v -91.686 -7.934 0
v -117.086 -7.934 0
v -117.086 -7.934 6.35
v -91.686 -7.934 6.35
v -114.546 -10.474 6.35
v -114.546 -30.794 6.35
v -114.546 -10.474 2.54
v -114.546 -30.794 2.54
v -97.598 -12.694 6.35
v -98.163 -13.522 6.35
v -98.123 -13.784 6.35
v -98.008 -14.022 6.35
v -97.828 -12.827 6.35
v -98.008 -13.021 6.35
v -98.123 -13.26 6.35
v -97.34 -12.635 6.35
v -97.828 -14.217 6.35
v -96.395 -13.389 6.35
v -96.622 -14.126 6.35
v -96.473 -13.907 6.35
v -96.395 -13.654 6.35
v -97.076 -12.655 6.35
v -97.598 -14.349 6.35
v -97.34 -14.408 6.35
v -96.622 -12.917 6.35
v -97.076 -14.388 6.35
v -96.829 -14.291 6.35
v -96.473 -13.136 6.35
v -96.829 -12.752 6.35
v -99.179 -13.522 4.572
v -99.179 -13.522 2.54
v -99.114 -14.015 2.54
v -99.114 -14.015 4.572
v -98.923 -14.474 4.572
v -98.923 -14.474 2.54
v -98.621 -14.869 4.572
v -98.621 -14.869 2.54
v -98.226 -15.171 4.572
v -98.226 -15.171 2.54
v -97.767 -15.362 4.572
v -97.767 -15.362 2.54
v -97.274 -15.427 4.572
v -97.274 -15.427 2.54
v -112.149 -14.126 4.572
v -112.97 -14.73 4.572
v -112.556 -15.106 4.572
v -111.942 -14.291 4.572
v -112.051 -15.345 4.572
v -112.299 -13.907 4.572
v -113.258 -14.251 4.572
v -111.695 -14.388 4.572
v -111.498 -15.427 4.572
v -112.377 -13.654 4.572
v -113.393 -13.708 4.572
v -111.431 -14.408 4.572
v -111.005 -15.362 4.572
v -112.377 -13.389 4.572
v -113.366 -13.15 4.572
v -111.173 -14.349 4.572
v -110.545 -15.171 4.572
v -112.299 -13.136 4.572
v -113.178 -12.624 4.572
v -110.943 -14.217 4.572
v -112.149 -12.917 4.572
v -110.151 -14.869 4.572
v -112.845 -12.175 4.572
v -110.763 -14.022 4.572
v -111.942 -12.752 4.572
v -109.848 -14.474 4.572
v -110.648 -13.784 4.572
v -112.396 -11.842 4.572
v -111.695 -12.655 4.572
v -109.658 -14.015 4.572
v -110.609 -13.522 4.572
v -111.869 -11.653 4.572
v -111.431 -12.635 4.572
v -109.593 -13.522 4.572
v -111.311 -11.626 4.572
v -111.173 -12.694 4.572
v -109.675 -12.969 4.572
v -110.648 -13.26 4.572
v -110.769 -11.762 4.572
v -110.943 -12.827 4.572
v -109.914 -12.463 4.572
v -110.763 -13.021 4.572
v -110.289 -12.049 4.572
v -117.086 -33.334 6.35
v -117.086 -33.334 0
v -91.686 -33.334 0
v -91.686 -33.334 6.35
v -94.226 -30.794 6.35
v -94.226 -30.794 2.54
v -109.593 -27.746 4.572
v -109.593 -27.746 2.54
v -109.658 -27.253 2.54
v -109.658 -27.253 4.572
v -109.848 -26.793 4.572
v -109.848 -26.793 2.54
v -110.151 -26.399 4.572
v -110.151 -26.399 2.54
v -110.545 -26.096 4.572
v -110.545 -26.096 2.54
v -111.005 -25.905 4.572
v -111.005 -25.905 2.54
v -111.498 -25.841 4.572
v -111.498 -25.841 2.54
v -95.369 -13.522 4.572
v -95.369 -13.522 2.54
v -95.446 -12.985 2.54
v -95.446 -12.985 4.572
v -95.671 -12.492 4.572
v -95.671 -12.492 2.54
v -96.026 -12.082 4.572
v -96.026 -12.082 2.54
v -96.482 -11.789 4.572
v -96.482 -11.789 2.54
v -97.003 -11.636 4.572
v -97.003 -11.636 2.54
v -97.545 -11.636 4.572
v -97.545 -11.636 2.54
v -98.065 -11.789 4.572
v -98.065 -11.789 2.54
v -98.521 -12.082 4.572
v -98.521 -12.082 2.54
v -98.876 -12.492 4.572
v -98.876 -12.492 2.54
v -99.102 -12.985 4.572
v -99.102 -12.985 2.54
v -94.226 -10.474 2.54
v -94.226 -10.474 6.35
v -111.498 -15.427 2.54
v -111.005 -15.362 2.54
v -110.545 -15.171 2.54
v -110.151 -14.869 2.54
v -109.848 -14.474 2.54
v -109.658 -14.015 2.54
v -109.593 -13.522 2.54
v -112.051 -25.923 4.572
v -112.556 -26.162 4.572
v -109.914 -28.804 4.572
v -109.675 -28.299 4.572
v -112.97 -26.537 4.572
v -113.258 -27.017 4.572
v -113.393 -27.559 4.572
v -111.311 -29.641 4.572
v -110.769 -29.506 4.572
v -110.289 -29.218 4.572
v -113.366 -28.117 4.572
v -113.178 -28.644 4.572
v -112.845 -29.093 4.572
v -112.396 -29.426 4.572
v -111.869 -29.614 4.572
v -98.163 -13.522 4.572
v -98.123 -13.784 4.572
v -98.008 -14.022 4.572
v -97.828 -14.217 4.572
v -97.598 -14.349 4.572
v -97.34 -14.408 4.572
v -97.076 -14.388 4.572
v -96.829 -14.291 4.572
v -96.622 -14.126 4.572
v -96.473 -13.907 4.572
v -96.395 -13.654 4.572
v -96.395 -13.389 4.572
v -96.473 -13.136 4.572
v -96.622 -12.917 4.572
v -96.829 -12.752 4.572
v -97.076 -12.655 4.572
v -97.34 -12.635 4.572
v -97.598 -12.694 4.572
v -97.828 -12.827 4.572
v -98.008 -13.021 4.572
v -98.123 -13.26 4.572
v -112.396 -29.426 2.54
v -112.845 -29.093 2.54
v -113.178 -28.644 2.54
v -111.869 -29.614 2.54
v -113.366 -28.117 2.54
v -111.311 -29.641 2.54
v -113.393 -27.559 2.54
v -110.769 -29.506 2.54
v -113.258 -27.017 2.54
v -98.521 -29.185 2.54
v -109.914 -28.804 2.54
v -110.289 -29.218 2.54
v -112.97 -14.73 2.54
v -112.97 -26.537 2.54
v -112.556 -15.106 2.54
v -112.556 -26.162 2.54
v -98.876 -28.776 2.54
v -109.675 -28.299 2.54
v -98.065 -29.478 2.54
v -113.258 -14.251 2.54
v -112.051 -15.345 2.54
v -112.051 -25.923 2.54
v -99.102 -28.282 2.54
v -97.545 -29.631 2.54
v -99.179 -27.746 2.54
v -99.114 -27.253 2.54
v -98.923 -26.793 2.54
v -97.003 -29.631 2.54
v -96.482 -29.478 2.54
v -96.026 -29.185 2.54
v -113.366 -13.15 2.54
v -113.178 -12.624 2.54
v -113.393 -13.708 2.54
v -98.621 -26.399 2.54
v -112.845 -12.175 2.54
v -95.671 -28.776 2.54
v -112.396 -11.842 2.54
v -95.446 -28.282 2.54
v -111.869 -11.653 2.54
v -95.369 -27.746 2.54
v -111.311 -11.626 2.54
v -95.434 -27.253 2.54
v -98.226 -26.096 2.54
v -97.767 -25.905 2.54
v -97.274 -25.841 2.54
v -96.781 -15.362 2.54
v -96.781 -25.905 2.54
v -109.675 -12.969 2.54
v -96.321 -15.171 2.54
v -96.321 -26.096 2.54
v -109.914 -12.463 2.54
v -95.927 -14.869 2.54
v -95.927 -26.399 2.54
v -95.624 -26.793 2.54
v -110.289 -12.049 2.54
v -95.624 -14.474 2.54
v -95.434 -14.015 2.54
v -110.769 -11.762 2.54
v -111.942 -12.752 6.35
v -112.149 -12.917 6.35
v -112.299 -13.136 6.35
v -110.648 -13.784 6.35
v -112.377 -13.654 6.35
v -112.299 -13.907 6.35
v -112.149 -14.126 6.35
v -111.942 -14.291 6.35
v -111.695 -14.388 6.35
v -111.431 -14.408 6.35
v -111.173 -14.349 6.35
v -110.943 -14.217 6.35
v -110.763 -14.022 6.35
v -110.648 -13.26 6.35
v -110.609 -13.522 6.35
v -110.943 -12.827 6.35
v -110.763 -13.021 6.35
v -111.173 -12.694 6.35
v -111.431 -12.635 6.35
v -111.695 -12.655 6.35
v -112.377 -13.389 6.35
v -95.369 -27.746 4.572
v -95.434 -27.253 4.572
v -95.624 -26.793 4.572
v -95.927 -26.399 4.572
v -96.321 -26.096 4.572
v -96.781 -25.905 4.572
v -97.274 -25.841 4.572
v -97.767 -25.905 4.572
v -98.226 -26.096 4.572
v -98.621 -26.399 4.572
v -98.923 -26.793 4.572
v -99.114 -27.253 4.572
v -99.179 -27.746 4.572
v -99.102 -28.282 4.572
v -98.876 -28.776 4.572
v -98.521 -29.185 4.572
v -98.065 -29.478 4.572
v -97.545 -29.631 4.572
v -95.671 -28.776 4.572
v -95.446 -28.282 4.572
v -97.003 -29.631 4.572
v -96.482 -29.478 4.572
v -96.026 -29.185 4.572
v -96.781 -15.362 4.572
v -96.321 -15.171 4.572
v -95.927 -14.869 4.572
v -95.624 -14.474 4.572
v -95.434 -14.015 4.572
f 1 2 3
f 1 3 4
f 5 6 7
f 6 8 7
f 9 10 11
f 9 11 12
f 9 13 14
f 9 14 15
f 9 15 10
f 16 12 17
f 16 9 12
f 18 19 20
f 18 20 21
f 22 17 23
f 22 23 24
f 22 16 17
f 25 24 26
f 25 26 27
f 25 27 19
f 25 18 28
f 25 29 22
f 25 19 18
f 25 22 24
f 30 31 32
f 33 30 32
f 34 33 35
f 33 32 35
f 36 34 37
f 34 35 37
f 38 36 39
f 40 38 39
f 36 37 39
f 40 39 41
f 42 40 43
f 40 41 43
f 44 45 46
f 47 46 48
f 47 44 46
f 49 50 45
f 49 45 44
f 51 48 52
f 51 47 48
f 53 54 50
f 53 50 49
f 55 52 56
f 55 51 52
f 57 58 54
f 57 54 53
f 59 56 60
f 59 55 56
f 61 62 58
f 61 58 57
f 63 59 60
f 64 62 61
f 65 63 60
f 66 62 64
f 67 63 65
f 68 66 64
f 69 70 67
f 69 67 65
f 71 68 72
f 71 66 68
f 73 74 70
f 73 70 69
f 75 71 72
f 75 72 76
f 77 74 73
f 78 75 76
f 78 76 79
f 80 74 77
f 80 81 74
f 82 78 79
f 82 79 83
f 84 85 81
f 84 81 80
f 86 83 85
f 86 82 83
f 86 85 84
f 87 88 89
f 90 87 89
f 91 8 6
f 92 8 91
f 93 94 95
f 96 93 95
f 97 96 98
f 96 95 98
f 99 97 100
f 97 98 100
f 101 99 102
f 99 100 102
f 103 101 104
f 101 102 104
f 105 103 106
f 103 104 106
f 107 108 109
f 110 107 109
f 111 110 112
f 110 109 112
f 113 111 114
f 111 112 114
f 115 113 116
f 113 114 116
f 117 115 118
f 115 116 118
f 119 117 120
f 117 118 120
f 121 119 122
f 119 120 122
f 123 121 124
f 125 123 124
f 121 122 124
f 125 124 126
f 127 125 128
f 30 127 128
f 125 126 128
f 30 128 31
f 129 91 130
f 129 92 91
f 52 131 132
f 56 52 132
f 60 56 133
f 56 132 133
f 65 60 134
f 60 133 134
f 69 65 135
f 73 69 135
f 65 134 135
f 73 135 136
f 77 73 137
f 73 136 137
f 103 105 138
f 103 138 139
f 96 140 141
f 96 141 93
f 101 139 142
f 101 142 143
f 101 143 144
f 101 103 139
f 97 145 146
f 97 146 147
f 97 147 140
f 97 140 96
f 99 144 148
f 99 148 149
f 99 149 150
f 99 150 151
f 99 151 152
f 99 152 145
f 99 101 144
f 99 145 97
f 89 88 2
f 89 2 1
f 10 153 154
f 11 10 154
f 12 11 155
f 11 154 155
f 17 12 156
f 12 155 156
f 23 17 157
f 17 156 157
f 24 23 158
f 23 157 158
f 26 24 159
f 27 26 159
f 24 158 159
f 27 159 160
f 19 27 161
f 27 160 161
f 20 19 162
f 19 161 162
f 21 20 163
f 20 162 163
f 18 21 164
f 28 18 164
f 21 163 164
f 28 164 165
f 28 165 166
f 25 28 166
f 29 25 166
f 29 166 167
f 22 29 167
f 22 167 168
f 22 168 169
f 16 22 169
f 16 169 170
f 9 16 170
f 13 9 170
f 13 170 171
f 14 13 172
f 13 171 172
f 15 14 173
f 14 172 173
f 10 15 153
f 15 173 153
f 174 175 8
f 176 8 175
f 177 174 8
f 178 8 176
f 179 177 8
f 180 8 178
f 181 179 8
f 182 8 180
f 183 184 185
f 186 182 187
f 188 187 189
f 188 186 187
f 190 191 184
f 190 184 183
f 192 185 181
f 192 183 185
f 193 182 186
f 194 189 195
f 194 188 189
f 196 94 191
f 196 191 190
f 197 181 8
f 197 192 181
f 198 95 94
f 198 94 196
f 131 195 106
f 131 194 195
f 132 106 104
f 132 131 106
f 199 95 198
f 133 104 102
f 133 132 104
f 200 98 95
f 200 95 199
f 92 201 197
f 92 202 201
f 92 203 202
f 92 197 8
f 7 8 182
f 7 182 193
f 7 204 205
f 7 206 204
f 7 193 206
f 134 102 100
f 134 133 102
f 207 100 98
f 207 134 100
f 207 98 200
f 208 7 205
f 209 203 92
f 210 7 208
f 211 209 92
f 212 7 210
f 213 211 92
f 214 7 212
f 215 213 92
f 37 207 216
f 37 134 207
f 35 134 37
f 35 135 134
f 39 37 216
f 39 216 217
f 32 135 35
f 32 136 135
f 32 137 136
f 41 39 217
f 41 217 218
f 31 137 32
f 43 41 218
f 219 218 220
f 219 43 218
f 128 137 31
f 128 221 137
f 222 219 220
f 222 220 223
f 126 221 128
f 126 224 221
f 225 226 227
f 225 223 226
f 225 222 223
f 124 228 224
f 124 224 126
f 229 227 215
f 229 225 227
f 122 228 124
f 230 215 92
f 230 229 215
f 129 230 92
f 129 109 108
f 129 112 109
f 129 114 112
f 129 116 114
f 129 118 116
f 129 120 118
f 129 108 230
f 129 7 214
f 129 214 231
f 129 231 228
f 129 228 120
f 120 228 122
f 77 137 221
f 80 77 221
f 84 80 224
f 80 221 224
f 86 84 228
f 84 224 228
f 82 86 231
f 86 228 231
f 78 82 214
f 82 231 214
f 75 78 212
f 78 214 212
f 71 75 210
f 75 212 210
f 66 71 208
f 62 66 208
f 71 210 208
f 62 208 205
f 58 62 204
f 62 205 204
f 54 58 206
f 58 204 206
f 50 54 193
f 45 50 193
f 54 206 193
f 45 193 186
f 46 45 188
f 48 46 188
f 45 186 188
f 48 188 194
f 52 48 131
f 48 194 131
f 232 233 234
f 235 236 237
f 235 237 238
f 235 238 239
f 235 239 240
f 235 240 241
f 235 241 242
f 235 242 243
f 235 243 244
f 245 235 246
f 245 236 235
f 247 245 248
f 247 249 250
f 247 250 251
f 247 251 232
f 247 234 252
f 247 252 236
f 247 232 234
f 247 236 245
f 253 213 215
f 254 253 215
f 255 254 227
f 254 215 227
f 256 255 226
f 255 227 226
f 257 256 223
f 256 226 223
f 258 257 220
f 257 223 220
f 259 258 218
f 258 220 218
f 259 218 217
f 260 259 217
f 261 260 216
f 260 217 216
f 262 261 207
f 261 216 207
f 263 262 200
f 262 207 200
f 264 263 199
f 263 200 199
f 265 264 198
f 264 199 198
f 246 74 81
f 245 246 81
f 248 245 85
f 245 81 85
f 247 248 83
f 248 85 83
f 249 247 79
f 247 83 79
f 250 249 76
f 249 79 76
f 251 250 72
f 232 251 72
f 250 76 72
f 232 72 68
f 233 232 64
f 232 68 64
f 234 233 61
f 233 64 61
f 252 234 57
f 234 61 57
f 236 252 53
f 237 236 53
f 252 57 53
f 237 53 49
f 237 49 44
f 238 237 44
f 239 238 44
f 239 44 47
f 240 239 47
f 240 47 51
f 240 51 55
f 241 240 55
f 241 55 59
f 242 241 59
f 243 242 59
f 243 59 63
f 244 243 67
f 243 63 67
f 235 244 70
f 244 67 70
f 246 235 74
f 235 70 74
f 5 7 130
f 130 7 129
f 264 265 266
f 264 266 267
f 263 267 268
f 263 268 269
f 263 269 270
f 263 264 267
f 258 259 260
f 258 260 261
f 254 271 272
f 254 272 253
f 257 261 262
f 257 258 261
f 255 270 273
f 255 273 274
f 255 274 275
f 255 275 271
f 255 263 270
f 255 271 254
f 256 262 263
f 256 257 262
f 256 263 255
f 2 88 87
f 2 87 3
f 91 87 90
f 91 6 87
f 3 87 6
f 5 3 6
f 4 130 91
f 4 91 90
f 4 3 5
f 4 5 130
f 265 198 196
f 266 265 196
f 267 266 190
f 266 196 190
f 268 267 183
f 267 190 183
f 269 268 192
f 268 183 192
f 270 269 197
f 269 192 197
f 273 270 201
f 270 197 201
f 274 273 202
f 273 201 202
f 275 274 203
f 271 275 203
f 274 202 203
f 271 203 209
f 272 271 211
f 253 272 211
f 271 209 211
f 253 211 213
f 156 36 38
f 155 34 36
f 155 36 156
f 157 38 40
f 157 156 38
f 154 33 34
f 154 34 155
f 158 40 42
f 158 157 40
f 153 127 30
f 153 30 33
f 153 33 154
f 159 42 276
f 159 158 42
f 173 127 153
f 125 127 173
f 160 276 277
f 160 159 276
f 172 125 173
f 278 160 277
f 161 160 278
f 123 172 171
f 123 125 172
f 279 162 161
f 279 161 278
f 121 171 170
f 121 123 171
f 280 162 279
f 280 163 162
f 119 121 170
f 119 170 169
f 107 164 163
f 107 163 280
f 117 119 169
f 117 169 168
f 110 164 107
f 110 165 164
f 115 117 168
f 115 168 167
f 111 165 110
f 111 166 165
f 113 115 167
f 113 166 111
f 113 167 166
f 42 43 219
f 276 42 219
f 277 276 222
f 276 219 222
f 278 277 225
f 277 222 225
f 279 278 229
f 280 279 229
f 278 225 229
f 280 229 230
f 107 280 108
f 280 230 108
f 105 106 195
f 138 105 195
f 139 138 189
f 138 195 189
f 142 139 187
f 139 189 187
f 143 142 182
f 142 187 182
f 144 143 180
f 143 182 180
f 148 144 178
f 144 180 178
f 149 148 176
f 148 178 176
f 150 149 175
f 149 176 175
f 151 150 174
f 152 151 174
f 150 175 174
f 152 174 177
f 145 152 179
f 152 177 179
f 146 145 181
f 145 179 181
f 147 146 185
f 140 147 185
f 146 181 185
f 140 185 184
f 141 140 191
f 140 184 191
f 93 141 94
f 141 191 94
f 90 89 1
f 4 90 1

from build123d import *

# Parameters (mm, degrees)
F0_W     = 25.4
F0_H     = 25.4
F1_DEPTH = 6.35
F2_T     = -2.54
F4_DEPTH = 2.032
F5_R     = 0.889
F6_DEPTH = 1.778


with BuildPart() as f1:
    # F0 (on Top) → F1 (new body)
    with BuildSketch(Plane.XY):
        with Locations((-104.38567, -20.633587)):
            Rectangle(F0_W, F0_H)
    extrude(amount=F1_DEPTH)

    # F2
    f2_openings = [f1.faces().sort_by_distance(p)[0] for p in [
        (-104.38567, -20.633587, 6.35),
    ]]
    offset(amount=F2_T, openings=f2_openings)

    # F3 (on face) → F4 (join)
    with BuildSketch(Plane.XY.offset(2.54)):
        with BuildLine():
            ThreePointArc((-111.49767, -15.426587), (-110.150632, -14.868626), (-109.59267, -13.521587))
            Line((-109.59267, -13.521587), (-111.49767, -13.521587))
            Line((-111.49767, -13.521587), (-111.49767, -15.426587))
        make_face()
        with BuildLine():
            Line((-111.49767, -13.521587), (-109.59267, -13.521587))
            ThreePointArc((-109.59267, -13.521587), (-112.844708, -12.174549), (-111.49767, -15.426587))
            Line((-111.49767, -15.426587), (-111.49767, -13.521587))
        make_face()
        with BuildLine():
            ThreePointArc((-95.36867, -13.521587), (-97.27367, -11.616587), (-99.17867, -13.521587))
            Line((-99.17867, -13.521587), (-97.27367, -13.521587))
            Line((-97.27367, -13.521587), (-97.27367, -15.426587))
            ThreePointArc((-97.27367, -15.426587), (-95.926632, -14.868626), (-95.36867, -13.521587))
        make_face()
        with BuildLine():
            Line((-97.27367, -13.521587), (-99.17867, -13.521587))
            ThreePointArc((-99.17867, -13.521587), (-98.620708, -14.868626), (-97.27367, -15.426587))
            Line((-97.27367, -15.426587), (-97.27367, -13.521587))
        make_face()
        with BuildLine():
            Line((-97.27367, -27.745587), (-97.27367, -25.840587))
            ThreePointArc((-97.27367, -25.840587), (-98.620708, -26.398549), (-99.17867, -27.745587))
            Line((-99.17867, -27.745587), (-97.27367, -27.745587))
        make_face()
        with BuildLine():
            ThreePointArc((-95.36867, -27.745587), (-95.926632, -26.398549), (-97.27367, -25.840587))
            Line((-97.27367, -25.840587), (-97.27367, -27.745587))
            Line((-97.27367, -27.745587), (-99.17867, -27.745587))
            ThreePointArc((-99.17867, -27.745587), (-97.27367, -29.650587), (-95.36867, -27.745587))
        make_face()
        with BuildLine():
            Line((-111.49767, -27.745587), (-111.49767, -25.840587))
            ThreePointArc((-111.49767, -25.840587), (-112.844708, -29.092626), (-109.59267, -27.745587))
            Line((-109.59267, -27.745587), (-111.49767, -27.745587))
        make_face()
        with BuildLine():
            ThreePointArc((-109.59267, -27.745587), (-110.150632, -26.398549), (-111.49767, -25.840587))
            Line((-111.49767, -25.840587), (-111.49767, -27.745587))
            Line((-111.49767, -27.745587), (-109.59267, -27.745587))
        make_face()
    extrude(amount=F4_DEPTH)

    # F5 (on face) → F6 (join)
    with BuildSketch(Plane.XY.offset(4.572)):
        with Locations((-111.49767, -13.521587)):
            Circle(F5_R)
        with BuildLine():
            ThreePointArc((-96.38467, -13.521587), (-97.27367, -12.632587), (-98.16267, -13.521587))
            ThreePointArc((-98.16267, -13.521587), (-97.27367, -14.410587), (-96.38467, -13.521587))
        make_face()
    extrude(amount=F6_DEPTH)


solid = f1.part
